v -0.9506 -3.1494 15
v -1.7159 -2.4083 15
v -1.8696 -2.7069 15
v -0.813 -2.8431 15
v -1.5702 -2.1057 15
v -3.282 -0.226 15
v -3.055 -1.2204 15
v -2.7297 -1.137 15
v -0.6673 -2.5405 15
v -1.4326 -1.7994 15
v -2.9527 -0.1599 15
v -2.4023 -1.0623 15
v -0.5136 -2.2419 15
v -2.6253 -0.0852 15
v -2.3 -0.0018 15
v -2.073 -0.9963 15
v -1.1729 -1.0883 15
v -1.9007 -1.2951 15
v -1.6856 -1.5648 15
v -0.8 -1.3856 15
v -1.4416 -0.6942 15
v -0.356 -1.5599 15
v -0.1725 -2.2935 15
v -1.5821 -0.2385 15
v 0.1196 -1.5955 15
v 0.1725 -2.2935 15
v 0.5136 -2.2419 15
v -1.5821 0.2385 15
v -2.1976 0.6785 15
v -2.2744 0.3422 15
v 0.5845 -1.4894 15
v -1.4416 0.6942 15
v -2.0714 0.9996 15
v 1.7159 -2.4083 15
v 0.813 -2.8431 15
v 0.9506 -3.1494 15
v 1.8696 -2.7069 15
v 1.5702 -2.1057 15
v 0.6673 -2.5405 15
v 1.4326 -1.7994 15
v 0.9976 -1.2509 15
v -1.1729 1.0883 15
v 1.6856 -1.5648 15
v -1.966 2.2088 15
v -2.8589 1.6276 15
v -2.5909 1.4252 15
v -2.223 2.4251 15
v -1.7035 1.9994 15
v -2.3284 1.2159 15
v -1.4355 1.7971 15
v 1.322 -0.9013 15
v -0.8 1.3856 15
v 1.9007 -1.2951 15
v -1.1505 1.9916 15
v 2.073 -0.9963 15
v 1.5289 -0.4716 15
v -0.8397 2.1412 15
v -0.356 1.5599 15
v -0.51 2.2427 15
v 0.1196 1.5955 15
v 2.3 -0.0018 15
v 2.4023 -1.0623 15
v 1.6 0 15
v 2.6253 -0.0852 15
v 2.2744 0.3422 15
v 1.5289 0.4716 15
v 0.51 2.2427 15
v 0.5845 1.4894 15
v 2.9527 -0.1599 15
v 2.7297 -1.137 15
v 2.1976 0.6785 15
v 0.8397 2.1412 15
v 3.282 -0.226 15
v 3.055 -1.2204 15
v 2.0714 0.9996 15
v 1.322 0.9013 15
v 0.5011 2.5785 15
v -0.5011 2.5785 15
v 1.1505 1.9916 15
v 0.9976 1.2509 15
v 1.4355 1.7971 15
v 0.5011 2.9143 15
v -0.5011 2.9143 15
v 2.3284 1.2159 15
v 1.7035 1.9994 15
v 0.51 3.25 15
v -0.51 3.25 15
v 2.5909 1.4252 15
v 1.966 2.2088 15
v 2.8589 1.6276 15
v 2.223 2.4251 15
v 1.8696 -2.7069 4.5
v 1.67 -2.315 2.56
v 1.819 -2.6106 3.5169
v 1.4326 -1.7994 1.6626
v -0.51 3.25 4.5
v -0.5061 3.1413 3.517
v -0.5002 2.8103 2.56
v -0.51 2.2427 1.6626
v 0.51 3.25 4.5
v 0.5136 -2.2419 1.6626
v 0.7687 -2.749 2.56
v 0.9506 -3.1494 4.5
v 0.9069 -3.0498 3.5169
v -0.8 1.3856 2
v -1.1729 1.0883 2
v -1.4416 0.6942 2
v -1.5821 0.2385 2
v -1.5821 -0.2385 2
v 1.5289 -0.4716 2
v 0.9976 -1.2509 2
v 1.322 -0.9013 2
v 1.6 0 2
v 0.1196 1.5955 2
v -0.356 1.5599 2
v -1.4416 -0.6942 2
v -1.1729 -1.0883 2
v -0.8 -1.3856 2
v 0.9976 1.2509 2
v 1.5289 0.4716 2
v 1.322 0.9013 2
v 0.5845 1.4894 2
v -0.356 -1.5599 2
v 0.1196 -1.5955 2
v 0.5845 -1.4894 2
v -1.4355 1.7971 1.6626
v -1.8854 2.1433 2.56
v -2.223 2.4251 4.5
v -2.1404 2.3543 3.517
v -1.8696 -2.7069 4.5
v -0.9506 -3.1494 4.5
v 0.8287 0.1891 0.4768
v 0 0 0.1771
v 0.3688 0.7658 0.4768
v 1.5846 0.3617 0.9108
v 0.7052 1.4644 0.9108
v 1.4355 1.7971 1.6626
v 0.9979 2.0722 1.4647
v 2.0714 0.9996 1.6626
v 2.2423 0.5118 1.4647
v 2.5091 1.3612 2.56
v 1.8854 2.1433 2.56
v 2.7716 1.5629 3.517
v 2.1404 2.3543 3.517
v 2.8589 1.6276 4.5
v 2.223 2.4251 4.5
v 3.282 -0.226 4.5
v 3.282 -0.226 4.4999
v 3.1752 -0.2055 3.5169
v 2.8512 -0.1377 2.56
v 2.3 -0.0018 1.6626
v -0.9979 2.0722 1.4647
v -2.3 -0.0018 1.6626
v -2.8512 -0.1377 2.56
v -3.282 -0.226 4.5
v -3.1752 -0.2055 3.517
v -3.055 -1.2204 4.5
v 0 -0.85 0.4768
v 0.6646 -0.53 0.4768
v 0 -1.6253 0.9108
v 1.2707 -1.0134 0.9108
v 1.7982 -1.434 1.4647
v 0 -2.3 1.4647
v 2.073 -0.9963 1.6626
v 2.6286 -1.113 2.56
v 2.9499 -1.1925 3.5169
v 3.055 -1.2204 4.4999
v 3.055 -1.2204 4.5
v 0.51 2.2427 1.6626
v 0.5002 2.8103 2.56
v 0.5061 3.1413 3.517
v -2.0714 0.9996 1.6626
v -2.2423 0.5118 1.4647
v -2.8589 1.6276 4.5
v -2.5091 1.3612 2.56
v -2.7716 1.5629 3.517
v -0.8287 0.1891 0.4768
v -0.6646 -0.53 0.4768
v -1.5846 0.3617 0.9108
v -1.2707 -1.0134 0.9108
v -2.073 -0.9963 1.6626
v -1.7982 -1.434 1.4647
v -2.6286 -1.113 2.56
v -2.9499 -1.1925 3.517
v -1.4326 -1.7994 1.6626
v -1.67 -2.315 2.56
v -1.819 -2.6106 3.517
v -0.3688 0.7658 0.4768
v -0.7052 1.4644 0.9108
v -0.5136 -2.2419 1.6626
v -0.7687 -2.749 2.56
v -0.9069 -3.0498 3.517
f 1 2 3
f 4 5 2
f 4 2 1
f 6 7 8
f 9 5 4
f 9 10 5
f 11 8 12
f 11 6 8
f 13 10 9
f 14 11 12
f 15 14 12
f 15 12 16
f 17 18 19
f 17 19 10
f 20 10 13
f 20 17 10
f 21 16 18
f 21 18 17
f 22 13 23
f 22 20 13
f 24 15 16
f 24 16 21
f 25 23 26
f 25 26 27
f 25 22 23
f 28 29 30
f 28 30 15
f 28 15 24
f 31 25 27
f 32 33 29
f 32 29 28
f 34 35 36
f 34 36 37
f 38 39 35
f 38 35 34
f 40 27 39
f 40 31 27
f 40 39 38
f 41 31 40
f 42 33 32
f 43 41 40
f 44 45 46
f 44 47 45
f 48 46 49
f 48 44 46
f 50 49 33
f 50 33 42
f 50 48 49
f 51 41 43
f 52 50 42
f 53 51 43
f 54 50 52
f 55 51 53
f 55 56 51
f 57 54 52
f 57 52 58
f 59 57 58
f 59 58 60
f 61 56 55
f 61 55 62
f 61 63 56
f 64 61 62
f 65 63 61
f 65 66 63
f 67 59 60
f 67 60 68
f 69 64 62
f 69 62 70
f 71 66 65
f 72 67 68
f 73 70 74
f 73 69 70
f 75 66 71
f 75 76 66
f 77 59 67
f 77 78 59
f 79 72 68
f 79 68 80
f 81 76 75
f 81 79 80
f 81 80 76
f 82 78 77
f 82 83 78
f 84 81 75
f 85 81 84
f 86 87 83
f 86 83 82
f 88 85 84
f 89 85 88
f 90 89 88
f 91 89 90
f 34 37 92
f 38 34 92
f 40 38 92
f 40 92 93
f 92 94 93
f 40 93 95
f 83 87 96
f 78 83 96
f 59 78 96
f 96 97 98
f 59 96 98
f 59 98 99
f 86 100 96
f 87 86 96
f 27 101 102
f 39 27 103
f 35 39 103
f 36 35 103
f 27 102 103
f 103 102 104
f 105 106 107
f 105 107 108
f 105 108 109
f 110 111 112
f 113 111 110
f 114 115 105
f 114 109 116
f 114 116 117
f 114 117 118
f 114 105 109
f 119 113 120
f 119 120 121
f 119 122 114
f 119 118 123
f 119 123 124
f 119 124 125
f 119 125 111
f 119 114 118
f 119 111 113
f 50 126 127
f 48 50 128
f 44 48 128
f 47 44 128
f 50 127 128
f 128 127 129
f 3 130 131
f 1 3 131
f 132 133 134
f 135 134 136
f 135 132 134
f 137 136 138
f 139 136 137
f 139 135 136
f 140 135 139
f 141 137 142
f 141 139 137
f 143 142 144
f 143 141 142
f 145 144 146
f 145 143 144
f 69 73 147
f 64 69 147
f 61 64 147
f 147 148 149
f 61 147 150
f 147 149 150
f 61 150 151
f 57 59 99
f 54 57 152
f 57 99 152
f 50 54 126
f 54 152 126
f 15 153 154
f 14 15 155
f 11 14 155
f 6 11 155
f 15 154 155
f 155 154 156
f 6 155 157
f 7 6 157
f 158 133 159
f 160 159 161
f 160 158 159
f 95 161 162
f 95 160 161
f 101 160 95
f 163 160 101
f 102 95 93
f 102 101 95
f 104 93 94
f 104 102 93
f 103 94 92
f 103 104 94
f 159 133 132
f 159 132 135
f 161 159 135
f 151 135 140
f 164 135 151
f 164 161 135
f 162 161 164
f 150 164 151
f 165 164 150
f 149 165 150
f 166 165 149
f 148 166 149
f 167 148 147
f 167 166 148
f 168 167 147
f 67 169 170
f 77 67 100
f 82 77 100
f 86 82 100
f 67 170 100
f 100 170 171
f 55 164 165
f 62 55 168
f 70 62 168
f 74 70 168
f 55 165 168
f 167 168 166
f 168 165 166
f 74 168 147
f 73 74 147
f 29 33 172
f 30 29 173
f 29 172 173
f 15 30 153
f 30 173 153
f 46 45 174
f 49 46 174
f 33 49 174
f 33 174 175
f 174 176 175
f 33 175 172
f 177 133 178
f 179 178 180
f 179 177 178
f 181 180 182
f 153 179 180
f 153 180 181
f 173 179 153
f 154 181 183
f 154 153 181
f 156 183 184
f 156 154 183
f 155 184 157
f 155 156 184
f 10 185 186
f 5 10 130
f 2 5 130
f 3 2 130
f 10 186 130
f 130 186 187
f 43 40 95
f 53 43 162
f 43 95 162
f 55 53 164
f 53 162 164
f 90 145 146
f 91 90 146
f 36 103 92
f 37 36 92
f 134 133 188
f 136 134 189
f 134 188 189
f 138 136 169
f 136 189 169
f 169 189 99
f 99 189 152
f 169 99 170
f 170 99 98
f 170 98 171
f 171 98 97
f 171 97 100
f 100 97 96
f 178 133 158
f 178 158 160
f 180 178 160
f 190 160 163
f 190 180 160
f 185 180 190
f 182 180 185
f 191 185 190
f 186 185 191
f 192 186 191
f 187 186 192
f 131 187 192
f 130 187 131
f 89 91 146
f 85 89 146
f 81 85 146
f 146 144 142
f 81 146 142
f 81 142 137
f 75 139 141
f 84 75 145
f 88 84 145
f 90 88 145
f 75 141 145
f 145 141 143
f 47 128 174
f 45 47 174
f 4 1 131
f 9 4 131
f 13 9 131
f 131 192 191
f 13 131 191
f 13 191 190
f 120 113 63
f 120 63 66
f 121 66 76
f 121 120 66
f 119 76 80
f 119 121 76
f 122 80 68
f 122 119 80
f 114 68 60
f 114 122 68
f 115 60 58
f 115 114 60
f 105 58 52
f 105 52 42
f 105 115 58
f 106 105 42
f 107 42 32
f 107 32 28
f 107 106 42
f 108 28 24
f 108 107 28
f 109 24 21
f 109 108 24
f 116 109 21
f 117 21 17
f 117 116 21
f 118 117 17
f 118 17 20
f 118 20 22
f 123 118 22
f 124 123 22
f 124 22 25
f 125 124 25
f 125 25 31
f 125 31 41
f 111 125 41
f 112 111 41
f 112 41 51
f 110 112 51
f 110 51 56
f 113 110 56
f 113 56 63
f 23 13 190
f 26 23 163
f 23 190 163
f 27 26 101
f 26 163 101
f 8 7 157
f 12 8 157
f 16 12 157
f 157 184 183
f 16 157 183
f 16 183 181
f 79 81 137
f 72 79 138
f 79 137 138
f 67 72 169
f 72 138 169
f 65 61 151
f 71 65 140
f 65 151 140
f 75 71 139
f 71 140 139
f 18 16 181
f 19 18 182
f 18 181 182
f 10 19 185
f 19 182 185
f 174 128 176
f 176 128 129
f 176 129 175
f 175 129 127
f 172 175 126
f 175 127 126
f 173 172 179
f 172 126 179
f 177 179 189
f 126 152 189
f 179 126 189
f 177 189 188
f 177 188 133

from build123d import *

# Parameters (mm, degrees)
F0_R         = 1.6
F1_DEPTH     = 15
F2_DEPTH     = 2
F3_T1_DEPTH  = 23.52
F3_T3_DEPTH  = 23.52
F3_T5_DEPTH  = 23.52
F3_T7_DEPTH  = 23.52
F3_T9_DEPTH  = 23.52
F3_T11_DEPTH = 23.52
F3_T13_DEPTH = 23.52


# Not quite as in the source:
# - a fillet or chamfer that OpenCascade refuses, or shapes differently, is made with other operations: its cross-section is extruded or revolved along the edge and cut away or added


with BuildPart() as f1:
    # F0 (on Top) → F1 (new body)
    with BuildSketch(Plane.XY):
        with BuildLine():
            ThreePointArc((-2.858932117, 1.6276078), (-2.4589449365, 1.3214191477), (-2.071427552, 0.9995938658))
            ThreePointArc((-2.071427552, 0.9995938658), (-2.242334198, 0.5117981481), (-2.2999992606, -0.0018442221))
            ThreePointArc((-2.2999992606, -0.0018442221), (-2.7887751164, -0.1236612902), (-3.2820013909, -0.2259798001))
            Line((-3.2820013909, -0.2259798001), (-3.0550300383, -1.2204062706))
            ThreePointArc((-3.0550300383, -1.2204062706), (-2.5662541825, -1.0985892024), (-2.073027908, -0.9962706925))
            ThreePointArc((-2.073027908, -0.9962706925), (-1.7982124097, -1.4340265443), (-1.4325842124, -1.7993616853))
            ThreePointArc((-1.4325842124, -1.7993616853), (-1.6420905549, -2.2574537369), (-1.8696162748, -2.7068681137))
            Line((-1.8696162748, -2.7068681137), (-0.9506280295, -3.1494295276))
            ThreePointArc((-0.9506280295, -3.1494295276), (-0.741121687, -2.691337476), (-0.5135959671, -2.2419230992))
            ThreePointArc((-0.5135959671, -2.2419230992), (0, -2.3), (0.5135959671, -2.2419230992))
            ThreePointArc((0.5135959671, -2.2419230992), (0.9979326, -2.0722283962), (1.4325842124, -1.7993616853))
            ThreePointArc((1.4325842124, -1.7993616853), (1.7982124097, -1.4340265443), (2.073027908, -0.9962706925))
            ThreePointArc((2.073027908, -0.9962706925), (2.242334198, -0.5117981481), (2.2999992606, -0.0018442221))
            ThreePointArc((2.2999992606, -0.0018442221), (2.242334198, 0.5117981481), (2.071427552, 0.9995938658))
            ThreePointArc((2.071427552, 0.9995938658), (2.4589449365, 1.3214191477), (2.858932117, 1.6276078))
            Line((2.858932117, 1.6276078), (2.2229725191, 2.4250759121))
            ThreePointArc((2.2229725191, 2.4250759121), (1.8354551346, 2.1032506302), (1.4354679542, 1.797061978))
            ThreePointArc((1.4354679542, 1.797061978), (0.9979326, 2.0722283962), (0.51, 2.2427438552))
            ThreePointArc((0.51, 2.2427438552), (0.5, 2.7463719276), (0.51, 3.25))
            Line((0.51, 3.25), (-0.51, 3.25))
            ThreePointArc((-0.51, 3.25), (-0.5, 2.7463719276), (-0.51, 2.2427438552))
            ThreePointArc((-0.51, 2.2427438552), (-0.9979326, 2.0722283962), (-1.4354679542, 1.797061978))
            ThreePointArc((-1.4354679542, 1.797061978), (-1.8354551346, 2.1032506302), (-2.2229725191, 2.4250759121))
            Line((-2.2229725191, 2.4250759121), (-2.858932117, 1.6276078))
        make_face()
        Circle(F0_R, mode=Mode.SUBTRACT)
        with BuildLine():
            ThreePointArc((2.2999992606, -0.0018442221), (2.242334198, -0.5117981481), (2.073027908, -0.9962706925))
            ThreePointArc((2.073027908, -0.9962706925), (2.5662541825, -1.0985892024), (3.0550300383, -1.2204062706))
            Line((3.0550300383, -1.2204062706), (3.2820013909, -0.2259798001))
            ThreePointArc((3.2820013909, -0.2259798001), (2.7887751164, -0.1236612902), (2.2999992606, -0.0018442221))
        make_face()
        with BuildLine():
            ThreePointArc((1.4325842124, -1.7993616853), (0.9979326, -2.0722283962), (0.5135959671, -2.2419230992))
            ThreePointArc((0.5135959671, -2.2419230992), (0.741121687, -2.691337476), (0.9506280295, -3.1494295276))
            Line((0.9506280295, -3.1494295276), (1.8696162748, -2.7068681137))
            ThreePointArc((1.8696162748, -2.7068681137), (1.6420905549, -2.2574537369), (1.4325842124, -1.7993616853))
        make_face()
    extrude(amount=F1_DEPTH)

    # F0 (on Top) → F2 (join)
    with BuildSketch(Plane.XY):
        Circle(F0_R)
    extrude(amount=F2_DEPTH)

    # F3: fillet of radius 4.5 on 7 edges, made by hand

    # F3_s2 → F3_t1 (cut)
    with BuildSketch(Plane(origin=(-10.5953938865, -5.102472772, 0), x_dir=(0, 0, 1), z_dir=(0.9009688679, 0.4338837391, 0))):
        with BuildLine():
            ThreePointArc((0, -1.25), (1.3180194847, 1.9319805153), (4.5, 3.25))
            Line((4.5, 3.25), (0, 3.25))
            Line((0, 3.25), (0, -1.25))
        make_face()
    extrude(amount=F3_T1_DEPTH, mode=Mode.SUBTRACT)

    # F3_s4 → F3_t3 (cut)
    with BuildSketch(Plane(origin=(-10.5953938865, 5.102472772, 0), x_dir=(0, 0, 1), z_dir=(0.9009688679, -0.4338837391, 0))):
        with BuildLine():
            ThreePointArc((0, -1.25), (1.3180194847, 1.9319805153), (4.5, 3.25))
            Line((4.5, 3.25), (0, 3.25))
            Line((0, 3.25), (0, -1.25))
        make_face()
    extrude(amount=F3_T3_DEPTH, mode=Mode.SUBTRACT)

    # F3_s6 → F3_t5 (cut)
    with BuildSketch(Plane(origin=(-2.6168461833, 11.4651522473, 0), x_dir=(0, 0, 1), z_dir=(0.222520934, -0.9749279122, 0))):
        with BuildLine():
            ThreePointArc((0, -1.25), (1.3180194847, 1.9319805153), (4.5, 3.25))
            Line((4.5, 3.25), (0, 3.25))
            Line((0, 3.25), (0, -1.25))
        make_face()
    extrude(amount=F3_T5_DEPTH, mode=Mode.SUBTRACT)

    # F3_s8 → F3_t7 (cut)
    with BuildSketch(Plane(origin=(7.3322400699, 9.1943382338, 0), x_dir=(0, 0, 1), z_dir=(-0.6234898019, -0.7818314825, 0))):
        with BuildLine():
            ThreePointArc((4.5, 3.25), (1.3180194847, 1.9319805153), (0, -1.25))
            Line((0, -1.25), (0, 3.25))
            Line((0, 3.25), (4.5, 3.25))
        make_face()
    extrude(amount=F3_T7_DEPTH, mode=Mode.SUBTRACT)

    # F3_s10 → F3_t9 (cut)
    with BuildSketch(Plane.YZ.offset(-11.76)):
        with BuildLine():
            ThreePointArc((-1.25, 0), (1.9319805153, 1.3180194847), (3.25, 4.5))
            Line((3.25, 4.5), (3.25, 0))
            Line((3.25, 0), (-1.25, 0))
        make_face()
    extrude(amount=F3_T9_DEPTH, mode=Mode.SUBTRACT)

    # F3_s12 → F3_t11 (cut)
    with BuildSketch(Plane(origin=(7.3322400699, -9.1943382338, 0), x_dir=(0, 0, 1), z_dir=(-0.6234898019, 0.7818314825, 0))):
        with BuildLine():
            ThreePointArc((0, -1.25), (1.3180194847, 1.9319805153), (4.5, 3.25))
            Line((4.5, 3.25), (0, 3.25))
            Line((0, 3.25), (0, -1.25))
        make_face()
    extrude(amount=F3_T11_DEPTH, mode=Mode.SUBTRACT)

    # F3_s14 → F3_t13 (cut)
    with BuildSketch(Plane(origin=(-2.6168461833, -11.4651522473, 0), x_dir=(0, 0, 1), z_dir=(0.222520934, 0.9749279122, 0))):
        with BuildLine():
            ThreePointArc((0, -1.25), (1.3180194847, 1.9319805153), (4.5, 3.25))
            Line((4.5, 3.25), (0, 3.25))
            Line((0, 3.25), (0, -1.25))
        make_face()
    extrude(amount=F3_T13_DEPTH, mode=Mode.SUBTRACT)


solid = f1.part
